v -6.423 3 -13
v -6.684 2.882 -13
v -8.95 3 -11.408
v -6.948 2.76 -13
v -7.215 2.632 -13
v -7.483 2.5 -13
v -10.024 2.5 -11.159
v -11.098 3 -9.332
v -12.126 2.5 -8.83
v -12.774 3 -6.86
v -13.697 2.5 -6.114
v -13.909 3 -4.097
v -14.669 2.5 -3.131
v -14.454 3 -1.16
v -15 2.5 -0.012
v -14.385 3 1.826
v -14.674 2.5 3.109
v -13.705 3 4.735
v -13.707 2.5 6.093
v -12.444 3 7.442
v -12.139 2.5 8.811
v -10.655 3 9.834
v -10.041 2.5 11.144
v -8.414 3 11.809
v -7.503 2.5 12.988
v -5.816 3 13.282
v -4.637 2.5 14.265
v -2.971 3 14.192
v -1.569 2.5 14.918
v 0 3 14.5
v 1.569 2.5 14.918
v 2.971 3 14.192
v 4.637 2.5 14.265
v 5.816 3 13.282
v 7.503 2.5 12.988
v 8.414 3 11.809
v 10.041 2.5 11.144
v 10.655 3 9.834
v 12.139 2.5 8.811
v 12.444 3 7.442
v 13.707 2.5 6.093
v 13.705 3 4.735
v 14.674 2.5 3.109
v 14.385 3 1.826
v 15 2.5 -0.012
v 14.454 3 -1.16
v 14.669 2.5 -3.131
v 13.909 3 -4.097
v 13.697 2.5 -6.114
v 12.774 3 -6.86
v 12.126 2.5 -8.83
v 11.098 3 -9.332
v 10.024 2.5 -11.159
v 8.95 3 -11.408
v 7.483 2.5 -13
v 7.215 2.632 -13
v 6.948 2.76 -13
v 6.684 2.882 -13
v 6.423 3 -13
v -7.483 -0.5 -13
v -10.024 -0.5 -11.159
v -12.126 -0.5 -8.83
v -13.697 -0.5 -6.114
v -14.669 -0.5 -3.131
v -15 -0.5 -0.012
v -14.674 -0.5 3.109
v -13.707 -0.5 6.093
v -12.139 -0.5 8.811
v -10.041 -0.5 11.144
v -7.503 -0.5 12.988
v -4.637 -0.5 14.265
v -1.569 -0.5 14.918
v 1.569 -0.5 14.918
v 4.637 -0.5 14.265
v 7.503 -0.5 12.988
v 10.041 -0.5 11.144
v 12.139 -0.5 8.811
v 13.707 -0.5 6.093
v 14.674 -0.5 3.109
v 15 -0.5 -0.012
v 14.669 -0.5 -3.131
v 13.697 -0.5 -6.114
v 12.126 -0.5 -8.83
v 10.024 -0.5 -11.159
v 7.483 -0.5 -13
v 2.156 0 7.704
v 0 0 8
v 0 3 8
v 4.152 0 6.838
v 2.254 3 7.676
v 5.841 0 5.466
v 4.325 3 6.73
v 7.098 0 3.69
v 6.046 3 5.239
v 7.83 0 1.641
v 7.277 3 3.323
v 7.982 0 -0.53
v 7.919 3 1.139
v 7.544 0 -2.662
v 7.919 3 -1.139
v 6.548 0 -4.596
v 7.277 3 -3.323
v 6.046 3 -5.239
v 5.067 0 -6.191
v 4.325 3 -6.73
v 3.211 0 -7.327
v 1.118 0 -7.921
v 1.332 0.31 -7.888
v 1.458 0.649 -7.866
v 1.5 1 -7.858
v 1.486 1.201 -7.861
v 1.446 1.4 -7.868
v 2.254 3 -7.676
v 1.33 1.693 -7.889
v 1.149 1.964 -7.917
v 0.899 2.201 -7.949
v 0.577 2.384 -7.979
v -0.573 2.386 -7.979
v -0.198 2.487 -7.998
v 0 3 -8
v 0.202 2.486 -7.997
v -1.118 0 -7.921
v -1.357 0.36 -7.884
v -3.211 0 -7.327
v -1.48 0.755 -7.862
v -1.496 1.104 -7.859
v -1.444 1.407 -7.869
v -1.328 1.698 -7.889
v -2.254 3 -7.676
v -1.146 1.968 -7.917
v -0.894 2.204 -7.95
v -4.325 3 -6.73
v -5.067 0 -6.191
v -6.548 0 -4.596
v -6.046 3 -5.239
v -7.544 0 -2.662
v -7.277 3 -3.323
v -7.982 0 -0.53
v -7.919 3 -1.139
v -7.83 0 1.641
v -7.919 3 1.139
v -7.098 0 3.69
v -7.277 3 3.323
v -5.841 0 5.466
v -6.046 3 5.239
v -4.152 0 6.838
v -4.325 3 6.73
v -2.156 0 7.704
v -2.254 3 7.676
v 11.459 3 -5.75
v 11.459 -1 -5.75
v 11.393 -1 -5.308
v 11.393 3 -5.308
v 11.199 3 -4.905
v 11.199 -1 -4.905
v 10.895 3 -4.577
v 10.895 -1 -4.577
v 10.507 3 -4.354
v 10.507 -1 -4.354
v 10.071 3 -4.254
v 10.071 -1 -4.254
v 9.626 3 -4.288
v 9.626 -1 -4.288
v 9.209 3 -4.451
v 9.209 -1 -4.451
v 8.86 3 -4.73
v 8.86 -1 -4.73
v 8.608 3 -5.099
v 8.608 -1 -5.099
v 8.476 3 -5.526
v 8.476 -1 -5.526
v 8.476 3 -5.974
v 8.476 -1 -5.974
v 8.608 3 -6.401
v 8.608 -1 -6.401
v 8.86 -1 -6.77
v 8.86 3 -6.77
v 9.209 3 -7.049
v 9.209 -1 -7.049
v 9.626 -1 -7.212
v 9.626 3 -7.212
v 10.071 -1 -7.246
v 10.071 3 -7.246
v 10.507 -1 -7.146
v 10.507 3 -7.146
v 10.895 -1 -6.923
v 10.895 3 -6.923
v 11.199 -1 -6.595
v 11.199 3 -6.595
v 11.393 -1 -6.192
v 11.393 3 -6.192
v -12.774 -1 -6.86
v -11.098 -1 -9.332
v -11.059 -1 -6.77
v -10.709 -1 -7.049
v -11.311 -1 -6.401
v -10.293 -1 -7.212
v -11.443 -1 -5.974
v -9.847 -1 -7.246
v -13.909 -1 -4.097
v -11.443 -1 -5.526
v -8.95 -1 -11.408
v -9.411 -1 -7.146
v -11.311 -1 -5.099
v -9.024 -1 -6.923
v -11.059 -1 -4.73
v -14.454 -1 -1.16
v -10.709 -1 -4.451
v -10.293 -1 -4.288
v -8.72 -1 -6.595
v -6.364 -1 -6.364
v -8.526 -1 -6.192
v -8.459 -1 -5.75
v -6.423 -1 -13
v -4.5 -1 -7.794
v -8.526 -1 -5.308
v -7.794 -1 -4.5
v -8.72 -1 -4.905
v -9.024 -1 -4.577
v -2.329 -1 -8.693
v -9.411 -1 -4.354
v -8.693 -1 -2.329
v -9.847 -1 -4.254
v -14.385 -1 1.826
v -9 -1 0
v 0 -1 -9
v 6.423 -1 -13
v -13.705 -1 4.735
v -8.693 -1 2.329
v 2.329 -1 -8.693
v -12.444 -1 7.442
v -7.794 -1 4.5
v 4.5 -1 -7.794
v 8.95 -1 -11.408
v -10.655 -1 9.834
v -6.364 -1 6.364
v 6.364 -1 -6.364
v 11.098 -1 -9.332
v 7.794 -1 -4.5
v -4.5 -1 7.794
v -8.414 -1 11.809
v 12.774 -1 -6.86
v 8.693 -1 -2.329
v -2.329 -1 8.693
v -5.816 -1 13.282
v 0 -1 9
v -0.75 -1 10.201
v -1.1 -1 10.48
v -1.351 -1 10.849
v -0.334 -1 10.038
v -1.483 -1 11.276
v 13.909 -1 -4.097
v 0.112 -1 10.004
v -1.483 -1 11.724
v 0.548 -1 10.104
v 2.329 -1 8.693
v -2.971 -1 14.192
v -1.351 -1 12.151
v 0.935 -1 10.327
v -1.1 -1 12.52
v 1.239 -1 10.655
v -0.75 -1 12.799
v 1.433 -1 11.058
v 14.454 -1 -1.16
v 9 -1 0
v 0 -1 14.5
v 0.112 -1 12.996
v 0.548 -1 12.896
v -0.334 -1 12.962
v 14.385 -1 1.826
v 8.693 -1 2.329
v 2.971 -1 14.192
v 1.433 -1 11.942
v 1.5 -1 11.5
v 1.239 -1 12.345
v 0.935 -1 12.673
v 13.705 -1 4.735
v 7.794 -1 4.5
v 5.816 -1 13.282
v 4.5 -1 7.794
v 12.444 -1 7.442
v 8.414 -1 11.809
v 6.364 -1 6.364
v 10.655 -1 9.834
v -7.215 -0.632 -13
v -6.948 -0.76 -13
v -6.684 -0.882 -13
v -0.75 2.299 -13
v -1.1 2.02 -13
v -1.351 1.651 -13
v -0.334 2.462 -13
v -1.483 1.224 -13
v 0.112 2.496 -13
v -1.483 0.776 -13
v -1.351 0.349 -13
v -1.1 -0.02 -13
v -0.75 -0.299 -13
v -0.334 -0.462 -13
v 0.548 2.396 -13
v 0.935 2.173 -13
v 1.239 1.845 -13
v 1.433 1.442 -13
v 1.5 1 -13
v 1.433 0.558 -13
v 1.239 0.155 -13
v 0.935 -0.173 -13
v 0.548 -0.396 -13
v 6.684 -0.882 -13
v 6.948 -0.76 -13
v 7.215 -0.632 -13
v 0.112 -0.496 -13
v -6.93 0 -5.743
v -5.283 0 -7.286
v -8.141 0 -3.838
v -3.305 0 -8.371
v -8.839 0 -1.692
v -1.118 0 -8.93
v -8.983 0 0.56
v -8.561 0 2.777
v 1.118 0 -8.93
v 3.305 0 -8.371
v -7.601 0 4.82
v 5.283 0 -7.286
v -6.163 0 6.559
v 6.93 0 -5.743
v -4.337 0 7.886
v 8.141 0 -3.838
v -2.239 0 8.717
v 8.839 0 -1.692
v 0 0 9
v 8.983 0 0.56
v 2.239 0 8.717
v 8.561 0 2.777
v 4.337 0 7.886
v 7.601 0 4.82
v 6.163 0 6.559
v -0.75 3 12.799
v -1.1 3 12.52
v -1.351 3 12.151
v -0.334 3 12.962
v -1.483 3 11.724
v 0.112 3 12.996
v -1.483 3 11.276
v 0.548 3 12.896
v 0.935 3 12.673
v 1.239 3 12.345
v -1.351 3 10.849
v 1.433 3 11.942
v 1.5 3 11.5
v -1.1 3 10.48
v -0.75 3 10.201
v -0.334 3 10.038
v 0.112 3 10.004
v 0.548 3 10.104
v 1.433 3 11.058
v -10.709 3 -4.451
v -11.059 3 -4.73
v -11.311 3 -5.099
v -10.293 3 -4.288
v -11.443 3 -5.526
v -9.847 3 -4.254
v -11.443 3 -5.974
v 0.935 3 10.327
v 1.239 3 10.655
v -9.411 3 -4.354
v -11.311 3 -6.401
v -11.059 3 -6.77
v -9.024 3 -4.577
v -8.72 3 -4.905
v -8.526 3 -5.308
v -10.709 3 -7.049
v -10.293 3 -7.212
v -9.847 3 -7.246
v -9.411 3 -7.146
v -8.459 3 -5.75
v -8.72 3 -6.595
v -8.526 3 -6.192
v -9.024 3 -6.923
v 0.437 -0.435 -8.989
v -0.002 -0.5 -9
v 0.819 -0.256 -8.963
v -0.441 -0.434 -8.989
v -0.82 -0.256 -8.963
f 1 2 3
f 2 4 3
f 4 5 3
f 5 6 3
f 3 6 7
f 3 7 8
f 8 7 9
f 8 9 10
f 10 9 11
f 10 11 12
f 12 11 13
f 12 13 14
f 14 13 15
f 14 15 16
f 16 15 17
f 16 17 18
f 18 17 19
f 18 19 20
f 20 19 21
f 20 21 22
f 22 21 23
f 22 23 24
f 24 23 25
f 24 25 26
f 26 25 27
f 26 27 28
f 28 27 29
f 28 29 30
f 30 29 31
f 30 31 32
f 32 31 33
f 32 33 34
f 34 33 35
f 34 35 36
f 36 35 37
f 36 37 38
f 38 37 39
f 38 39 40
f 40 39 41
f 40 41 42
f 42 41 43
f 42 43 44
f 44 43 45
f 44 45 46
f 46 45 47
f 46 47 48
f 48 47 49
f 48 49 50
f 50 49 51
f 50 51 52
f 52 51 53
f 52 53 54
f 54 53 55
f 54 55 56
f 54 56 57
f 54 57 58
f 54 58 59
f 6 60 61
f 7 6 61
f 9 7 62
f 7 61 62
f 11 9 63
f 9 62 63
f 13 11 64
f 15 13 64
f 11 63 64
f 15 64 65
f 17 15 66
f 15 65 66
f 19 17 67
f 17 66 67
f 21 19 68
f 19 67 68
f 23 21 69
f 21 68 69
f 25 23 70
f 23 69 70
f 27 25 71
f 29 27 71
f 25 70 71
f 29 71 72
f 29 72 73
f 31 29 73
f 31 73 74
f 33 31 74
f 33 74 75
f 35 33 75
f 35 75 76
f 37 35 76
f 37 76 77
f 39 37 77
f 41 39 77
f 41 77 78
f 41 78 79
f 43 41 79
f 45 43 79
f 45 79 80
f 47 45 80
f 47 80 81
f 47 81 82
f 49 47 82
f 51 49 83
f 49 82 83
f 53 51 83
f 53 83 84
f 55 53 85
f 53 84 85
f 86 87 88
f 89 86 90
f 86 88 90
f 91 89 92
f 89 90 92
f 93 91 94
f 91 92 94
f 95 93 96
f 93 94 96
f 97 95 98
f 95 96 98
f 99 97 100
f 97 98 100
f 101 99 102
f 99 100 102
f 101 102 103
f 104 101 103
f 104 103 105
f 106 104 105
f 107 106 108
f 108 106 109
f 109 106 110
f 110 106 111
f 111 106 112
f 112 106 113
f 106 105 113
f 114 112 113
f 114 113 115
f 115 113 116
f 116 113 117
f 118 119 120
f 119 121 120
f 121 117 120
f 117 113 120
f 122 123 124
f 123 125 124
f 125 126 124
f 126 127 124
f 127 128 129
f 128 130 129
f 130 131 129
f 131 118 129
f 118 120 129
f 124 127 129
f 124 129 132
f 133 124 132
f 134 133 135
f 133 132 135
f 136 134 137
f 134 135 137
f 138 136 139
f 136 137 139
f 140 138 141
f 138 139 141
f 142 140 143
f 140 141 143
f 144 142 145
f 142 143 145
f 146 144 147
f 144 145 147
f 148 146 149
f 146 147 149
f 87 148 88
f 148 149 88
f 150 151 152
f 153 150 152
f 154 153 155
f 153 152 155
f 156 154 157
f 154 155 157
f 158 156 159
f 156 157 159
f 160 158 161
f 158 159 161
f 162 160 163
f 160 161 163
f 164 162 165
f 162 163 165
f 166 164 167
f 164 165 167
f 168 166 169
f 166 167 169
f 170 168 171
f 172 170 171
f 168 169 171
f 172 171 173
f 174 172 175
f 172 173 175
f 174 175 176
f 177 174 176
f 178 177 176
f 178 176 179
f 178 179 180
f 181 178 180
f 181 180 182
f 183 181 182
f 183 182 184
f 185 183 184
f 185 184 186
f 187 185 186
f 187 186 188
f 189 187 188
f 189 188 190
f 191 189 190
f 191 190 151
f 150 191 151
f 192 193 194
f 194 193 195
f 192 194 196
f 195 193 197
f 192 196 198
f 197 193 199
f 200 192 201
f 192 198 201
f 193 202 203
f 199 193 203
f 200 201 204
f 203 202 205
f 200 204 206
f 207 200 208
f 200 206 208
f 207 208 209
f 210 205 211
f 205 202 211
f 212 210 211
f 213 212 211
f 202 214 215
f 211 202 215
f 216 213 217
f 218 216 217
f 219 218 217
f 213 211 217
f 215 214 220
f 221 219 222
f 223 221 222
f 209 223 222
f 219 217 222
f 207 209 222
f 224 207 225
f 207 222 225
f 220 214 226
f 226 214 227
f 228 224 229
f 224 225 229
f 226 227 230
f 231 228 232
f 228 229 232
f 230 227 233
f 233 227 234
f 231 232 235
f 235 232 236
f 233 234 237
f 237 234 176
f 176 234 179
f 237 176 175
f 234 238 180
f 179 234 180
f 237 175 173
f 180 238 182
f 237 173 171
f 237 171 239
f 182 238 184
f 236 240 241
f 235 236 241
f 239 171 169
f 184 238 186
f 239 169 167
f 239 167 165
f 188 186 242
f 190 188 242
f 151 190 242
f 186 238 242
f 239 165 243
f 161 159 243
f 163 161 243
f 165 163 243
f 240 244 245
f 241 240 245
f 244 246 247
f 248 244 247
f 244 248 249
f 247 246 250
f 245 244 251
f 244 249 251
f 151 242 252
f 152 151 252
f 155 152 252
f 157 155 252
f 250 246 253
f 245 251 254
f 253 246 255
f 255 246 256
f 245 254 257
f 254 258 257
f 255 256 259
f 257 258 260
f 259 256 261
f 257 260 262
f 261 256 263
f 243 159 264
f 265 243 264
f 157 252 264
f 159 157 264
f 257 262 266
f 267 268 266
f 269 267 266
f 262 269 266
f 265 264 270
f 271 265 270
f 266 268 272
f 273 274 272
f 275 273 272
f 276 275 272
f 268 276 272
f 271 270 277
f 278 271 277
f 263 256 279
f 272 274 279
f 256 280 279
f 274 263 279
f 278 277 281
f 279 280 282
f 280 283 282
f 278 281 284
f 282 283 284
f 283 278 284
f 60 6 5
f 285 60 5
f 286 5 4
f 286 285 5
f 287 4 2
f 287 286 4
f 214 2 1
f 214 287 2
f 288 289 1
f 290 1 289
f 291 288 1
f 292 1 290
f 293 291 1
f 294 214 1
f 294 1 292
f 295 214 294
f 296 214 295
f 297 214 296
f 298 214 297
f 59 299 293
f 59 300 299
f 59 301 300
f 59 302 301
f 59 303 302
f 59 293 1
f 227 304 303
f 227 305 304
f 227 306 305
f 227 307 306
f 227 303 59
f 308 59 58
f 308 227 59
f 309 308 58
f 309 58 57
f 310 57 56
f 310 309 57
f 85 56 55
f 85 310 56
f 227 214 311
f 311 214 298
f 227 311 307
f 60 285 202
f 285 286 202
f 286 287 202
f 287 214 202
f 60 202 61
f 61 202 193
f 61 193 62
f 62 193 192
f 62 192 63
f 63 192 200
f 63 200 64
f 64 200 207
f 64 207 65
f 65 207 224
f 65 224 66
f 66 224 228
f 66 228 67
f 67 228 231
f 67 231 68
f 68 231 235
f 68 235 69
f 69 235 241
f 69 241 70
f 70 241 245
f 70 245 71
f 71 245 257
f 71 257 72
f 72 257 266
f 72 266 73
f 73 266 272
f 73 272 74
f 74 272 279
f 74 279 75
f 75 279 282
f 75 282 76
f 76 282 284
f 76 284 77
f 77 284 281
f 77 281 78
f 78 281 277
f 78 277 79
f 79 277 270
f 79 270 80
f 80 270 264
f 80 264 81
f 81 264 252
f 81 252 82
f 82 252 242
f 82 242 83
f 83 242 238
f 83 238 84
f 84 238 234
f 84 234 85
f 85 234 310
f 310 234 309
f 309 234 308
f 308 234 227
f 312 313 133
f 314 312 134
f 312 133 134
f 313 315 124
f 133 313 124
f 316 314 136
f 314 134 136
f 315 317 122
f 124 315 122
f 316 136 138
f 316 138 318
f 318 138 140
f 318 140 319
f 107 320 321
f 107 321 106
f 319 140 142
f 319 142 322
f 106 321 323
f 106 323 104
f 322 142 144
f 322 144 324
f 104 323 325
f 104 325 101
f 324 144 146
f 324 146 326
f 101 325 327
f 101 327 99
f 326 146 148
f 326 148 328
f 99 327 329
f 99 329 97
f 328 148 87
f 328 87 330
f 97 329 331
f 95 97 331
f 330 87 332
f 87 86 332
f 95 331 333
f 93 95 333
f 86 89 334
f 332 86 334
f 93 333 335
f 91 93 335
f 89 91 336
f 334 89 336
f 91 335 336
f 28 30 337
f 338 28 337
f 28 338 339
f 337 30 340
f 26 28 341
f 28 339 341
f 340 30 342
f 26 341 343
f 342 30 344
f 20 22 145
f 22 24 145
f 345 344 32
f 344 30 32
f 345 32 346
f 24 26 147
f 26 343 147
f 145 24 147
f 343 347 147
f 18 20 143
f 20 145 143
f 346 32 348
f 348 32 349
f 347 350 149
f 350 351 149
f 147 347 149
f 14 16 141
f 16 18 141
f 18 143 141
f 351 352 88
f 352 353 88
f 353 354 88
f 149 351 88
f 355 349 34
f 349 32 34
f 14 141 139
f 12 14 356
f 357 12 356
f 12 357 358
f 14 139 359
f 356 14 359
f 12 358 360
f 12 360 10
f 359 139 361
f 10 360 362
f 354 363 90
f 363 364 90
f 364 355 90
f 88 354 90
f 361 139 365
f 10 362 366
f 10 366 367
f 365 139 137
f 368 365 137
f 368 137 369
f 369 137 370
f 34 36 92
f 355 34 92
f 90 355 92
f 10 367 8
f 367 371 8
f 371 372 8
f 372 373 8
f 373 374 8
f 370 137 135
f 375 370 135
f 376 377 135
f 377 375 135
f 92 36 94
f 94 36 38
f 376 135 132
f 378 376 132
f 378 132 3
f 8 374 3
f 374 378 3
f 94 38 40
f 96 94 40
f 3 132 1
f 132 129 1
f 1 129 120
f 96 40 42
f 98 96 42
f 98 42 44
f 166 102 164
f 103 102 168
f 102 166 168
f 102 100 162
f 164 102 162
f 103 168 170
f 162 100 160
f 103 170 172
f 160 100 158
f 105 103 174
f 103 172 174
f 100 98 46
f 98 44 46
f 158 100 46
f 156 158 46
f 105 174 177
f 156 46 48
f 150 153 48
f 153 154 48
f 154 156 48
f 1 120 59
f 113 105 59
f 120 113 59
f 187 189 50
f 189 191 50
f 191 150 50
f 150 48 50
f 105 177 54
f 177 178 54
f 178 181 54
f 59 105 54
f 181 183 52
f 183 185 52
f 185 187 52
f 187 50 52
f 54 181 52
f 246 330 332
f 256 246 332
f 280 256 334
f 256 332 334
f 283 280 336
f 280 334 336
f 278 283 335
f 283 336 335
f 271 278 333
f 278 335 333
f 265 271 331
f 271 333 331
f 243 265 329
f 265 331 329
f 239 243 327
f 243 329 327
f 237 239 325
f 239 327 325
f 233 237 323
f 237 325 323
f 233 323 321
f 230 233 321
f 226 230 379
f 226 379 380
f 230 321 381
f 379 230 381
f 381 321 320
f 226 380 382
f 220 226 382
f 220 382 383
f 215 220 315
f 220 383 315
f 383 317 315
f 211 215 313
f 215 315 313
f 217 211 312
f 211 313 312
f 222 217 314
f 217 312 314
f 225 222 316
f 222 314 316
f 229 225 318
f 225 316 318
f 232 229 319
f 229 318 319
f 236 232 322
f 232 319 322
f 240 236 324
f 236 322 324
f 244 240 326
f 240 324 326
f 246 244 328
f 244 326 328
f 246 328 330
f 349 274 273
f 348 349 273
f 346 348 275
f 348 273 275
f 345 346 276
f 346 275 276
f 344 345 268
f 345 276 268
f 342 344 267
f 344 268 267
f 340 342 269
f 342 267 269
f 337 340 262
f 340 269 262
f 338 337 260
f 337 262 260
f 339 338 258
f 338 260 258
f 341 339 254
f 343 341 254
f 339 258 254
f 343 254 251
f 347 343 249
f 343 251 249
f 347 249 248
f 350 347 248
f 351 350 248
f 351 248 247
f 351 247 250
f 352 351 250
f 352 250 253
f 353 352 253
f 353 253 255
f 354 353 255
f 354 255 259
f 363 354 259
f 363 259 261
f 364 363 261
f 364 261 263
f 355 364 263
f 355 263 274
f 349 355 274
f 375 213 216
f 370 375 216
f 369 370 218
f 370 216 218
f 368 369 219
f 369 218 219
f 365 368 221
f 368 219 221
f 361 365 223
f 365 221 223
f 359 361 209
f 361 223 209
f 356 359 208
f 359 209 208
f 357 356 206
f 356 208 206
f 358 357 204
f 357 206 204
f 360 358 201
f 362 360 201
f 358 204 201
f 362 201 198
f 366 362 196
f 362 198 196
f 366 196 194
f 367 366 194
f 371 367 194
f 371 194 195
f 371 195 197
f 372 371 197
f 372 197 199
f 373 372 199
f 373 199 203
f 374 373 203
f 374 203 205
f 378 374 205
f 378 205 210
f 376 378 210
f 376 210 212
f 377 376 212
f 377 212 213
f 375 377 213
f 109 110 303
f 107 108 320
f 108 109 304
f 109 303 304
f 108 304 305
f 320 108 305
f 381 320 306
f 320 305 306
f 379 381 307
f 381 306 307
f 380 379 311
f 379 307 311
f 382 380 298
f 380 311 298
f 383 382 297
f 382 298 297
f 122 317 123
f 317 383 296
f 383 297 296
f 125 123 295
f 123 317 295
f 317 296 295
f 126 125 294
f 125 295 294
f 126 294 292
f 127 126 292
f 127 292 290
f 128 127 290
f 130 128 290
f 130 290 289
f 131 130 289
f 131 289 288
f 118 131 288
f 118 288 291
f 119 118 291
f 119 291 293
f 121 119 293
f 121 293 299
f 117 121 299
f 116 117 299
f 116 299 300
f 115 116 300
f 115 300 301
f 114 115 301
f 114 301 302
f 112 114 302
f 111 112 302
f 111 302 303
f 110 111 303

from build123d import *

# Parameters (mm, degrees)
F2_SIZE  = 0.5
F3_W     = 18
F3_H     = 5
F4_DEPTH = 4.001
F5_R     = 1.5
F6_DEPTH = 5.1428832774
F7_R     = 1.5
F8_DEPTH = 4.0010001


with BuildPart() as f1:
    # F0 (on Right) → F1 (revolve)
    with BuildSketch(Plane.YZ):
        Polygon((0, 9), (0, 8), (3, 8), (3, 15), (-1, 15), (-1, 9), align=None)
    revolve(axis=Axis((0, 22.7407575149, 0), (0, 1, 0)))

    # F2
    f2_edges = [f1.edges().sort_by_distance(p)[0] for p in [
        (0, 3, -15),
        (0, -1, -15),
    ]]
    chamfer(f2_edges, length=F2_SIZE)

    # F3 (on face) → F4 (cut, through all)
    with BuildSketch(Plane.XZ.offset(1)):
        with Locations((0, -15.5)):
            Rectangle(F3_W, F3_H)
    extrude(amount=-F4_DEPTH, mode=Mode.SUBTRACT)

    # F5 (on face) → F6 (cut, through all)
    with BuildSketch(Plane(origin=(0, 0, -13), x_dir=(1, 0, 0), z_dir=(0, 0, -1))):
        with Locations((0, -1)):
            Circle(F5_R)
    extrude(amount=-F6_DEPTH, mode=Mode.SUBTRACT)

    # F7 (on face) → F8 (cut, through all)
    with BuildSketch(Plane.XZ.offset(1)):
        with Locations((0, 11.5)):
            Circle(F7_R)
        with Locations((-9.9592921435, -5.75)):
            Circle(F7_R)
        with Locations((9.9592921435, -5.75)):
            Circle(F7_R)
    extrude(amount=-F8_DEPTH, mode=Mode.SUBTRACT)


solid = f1.part
